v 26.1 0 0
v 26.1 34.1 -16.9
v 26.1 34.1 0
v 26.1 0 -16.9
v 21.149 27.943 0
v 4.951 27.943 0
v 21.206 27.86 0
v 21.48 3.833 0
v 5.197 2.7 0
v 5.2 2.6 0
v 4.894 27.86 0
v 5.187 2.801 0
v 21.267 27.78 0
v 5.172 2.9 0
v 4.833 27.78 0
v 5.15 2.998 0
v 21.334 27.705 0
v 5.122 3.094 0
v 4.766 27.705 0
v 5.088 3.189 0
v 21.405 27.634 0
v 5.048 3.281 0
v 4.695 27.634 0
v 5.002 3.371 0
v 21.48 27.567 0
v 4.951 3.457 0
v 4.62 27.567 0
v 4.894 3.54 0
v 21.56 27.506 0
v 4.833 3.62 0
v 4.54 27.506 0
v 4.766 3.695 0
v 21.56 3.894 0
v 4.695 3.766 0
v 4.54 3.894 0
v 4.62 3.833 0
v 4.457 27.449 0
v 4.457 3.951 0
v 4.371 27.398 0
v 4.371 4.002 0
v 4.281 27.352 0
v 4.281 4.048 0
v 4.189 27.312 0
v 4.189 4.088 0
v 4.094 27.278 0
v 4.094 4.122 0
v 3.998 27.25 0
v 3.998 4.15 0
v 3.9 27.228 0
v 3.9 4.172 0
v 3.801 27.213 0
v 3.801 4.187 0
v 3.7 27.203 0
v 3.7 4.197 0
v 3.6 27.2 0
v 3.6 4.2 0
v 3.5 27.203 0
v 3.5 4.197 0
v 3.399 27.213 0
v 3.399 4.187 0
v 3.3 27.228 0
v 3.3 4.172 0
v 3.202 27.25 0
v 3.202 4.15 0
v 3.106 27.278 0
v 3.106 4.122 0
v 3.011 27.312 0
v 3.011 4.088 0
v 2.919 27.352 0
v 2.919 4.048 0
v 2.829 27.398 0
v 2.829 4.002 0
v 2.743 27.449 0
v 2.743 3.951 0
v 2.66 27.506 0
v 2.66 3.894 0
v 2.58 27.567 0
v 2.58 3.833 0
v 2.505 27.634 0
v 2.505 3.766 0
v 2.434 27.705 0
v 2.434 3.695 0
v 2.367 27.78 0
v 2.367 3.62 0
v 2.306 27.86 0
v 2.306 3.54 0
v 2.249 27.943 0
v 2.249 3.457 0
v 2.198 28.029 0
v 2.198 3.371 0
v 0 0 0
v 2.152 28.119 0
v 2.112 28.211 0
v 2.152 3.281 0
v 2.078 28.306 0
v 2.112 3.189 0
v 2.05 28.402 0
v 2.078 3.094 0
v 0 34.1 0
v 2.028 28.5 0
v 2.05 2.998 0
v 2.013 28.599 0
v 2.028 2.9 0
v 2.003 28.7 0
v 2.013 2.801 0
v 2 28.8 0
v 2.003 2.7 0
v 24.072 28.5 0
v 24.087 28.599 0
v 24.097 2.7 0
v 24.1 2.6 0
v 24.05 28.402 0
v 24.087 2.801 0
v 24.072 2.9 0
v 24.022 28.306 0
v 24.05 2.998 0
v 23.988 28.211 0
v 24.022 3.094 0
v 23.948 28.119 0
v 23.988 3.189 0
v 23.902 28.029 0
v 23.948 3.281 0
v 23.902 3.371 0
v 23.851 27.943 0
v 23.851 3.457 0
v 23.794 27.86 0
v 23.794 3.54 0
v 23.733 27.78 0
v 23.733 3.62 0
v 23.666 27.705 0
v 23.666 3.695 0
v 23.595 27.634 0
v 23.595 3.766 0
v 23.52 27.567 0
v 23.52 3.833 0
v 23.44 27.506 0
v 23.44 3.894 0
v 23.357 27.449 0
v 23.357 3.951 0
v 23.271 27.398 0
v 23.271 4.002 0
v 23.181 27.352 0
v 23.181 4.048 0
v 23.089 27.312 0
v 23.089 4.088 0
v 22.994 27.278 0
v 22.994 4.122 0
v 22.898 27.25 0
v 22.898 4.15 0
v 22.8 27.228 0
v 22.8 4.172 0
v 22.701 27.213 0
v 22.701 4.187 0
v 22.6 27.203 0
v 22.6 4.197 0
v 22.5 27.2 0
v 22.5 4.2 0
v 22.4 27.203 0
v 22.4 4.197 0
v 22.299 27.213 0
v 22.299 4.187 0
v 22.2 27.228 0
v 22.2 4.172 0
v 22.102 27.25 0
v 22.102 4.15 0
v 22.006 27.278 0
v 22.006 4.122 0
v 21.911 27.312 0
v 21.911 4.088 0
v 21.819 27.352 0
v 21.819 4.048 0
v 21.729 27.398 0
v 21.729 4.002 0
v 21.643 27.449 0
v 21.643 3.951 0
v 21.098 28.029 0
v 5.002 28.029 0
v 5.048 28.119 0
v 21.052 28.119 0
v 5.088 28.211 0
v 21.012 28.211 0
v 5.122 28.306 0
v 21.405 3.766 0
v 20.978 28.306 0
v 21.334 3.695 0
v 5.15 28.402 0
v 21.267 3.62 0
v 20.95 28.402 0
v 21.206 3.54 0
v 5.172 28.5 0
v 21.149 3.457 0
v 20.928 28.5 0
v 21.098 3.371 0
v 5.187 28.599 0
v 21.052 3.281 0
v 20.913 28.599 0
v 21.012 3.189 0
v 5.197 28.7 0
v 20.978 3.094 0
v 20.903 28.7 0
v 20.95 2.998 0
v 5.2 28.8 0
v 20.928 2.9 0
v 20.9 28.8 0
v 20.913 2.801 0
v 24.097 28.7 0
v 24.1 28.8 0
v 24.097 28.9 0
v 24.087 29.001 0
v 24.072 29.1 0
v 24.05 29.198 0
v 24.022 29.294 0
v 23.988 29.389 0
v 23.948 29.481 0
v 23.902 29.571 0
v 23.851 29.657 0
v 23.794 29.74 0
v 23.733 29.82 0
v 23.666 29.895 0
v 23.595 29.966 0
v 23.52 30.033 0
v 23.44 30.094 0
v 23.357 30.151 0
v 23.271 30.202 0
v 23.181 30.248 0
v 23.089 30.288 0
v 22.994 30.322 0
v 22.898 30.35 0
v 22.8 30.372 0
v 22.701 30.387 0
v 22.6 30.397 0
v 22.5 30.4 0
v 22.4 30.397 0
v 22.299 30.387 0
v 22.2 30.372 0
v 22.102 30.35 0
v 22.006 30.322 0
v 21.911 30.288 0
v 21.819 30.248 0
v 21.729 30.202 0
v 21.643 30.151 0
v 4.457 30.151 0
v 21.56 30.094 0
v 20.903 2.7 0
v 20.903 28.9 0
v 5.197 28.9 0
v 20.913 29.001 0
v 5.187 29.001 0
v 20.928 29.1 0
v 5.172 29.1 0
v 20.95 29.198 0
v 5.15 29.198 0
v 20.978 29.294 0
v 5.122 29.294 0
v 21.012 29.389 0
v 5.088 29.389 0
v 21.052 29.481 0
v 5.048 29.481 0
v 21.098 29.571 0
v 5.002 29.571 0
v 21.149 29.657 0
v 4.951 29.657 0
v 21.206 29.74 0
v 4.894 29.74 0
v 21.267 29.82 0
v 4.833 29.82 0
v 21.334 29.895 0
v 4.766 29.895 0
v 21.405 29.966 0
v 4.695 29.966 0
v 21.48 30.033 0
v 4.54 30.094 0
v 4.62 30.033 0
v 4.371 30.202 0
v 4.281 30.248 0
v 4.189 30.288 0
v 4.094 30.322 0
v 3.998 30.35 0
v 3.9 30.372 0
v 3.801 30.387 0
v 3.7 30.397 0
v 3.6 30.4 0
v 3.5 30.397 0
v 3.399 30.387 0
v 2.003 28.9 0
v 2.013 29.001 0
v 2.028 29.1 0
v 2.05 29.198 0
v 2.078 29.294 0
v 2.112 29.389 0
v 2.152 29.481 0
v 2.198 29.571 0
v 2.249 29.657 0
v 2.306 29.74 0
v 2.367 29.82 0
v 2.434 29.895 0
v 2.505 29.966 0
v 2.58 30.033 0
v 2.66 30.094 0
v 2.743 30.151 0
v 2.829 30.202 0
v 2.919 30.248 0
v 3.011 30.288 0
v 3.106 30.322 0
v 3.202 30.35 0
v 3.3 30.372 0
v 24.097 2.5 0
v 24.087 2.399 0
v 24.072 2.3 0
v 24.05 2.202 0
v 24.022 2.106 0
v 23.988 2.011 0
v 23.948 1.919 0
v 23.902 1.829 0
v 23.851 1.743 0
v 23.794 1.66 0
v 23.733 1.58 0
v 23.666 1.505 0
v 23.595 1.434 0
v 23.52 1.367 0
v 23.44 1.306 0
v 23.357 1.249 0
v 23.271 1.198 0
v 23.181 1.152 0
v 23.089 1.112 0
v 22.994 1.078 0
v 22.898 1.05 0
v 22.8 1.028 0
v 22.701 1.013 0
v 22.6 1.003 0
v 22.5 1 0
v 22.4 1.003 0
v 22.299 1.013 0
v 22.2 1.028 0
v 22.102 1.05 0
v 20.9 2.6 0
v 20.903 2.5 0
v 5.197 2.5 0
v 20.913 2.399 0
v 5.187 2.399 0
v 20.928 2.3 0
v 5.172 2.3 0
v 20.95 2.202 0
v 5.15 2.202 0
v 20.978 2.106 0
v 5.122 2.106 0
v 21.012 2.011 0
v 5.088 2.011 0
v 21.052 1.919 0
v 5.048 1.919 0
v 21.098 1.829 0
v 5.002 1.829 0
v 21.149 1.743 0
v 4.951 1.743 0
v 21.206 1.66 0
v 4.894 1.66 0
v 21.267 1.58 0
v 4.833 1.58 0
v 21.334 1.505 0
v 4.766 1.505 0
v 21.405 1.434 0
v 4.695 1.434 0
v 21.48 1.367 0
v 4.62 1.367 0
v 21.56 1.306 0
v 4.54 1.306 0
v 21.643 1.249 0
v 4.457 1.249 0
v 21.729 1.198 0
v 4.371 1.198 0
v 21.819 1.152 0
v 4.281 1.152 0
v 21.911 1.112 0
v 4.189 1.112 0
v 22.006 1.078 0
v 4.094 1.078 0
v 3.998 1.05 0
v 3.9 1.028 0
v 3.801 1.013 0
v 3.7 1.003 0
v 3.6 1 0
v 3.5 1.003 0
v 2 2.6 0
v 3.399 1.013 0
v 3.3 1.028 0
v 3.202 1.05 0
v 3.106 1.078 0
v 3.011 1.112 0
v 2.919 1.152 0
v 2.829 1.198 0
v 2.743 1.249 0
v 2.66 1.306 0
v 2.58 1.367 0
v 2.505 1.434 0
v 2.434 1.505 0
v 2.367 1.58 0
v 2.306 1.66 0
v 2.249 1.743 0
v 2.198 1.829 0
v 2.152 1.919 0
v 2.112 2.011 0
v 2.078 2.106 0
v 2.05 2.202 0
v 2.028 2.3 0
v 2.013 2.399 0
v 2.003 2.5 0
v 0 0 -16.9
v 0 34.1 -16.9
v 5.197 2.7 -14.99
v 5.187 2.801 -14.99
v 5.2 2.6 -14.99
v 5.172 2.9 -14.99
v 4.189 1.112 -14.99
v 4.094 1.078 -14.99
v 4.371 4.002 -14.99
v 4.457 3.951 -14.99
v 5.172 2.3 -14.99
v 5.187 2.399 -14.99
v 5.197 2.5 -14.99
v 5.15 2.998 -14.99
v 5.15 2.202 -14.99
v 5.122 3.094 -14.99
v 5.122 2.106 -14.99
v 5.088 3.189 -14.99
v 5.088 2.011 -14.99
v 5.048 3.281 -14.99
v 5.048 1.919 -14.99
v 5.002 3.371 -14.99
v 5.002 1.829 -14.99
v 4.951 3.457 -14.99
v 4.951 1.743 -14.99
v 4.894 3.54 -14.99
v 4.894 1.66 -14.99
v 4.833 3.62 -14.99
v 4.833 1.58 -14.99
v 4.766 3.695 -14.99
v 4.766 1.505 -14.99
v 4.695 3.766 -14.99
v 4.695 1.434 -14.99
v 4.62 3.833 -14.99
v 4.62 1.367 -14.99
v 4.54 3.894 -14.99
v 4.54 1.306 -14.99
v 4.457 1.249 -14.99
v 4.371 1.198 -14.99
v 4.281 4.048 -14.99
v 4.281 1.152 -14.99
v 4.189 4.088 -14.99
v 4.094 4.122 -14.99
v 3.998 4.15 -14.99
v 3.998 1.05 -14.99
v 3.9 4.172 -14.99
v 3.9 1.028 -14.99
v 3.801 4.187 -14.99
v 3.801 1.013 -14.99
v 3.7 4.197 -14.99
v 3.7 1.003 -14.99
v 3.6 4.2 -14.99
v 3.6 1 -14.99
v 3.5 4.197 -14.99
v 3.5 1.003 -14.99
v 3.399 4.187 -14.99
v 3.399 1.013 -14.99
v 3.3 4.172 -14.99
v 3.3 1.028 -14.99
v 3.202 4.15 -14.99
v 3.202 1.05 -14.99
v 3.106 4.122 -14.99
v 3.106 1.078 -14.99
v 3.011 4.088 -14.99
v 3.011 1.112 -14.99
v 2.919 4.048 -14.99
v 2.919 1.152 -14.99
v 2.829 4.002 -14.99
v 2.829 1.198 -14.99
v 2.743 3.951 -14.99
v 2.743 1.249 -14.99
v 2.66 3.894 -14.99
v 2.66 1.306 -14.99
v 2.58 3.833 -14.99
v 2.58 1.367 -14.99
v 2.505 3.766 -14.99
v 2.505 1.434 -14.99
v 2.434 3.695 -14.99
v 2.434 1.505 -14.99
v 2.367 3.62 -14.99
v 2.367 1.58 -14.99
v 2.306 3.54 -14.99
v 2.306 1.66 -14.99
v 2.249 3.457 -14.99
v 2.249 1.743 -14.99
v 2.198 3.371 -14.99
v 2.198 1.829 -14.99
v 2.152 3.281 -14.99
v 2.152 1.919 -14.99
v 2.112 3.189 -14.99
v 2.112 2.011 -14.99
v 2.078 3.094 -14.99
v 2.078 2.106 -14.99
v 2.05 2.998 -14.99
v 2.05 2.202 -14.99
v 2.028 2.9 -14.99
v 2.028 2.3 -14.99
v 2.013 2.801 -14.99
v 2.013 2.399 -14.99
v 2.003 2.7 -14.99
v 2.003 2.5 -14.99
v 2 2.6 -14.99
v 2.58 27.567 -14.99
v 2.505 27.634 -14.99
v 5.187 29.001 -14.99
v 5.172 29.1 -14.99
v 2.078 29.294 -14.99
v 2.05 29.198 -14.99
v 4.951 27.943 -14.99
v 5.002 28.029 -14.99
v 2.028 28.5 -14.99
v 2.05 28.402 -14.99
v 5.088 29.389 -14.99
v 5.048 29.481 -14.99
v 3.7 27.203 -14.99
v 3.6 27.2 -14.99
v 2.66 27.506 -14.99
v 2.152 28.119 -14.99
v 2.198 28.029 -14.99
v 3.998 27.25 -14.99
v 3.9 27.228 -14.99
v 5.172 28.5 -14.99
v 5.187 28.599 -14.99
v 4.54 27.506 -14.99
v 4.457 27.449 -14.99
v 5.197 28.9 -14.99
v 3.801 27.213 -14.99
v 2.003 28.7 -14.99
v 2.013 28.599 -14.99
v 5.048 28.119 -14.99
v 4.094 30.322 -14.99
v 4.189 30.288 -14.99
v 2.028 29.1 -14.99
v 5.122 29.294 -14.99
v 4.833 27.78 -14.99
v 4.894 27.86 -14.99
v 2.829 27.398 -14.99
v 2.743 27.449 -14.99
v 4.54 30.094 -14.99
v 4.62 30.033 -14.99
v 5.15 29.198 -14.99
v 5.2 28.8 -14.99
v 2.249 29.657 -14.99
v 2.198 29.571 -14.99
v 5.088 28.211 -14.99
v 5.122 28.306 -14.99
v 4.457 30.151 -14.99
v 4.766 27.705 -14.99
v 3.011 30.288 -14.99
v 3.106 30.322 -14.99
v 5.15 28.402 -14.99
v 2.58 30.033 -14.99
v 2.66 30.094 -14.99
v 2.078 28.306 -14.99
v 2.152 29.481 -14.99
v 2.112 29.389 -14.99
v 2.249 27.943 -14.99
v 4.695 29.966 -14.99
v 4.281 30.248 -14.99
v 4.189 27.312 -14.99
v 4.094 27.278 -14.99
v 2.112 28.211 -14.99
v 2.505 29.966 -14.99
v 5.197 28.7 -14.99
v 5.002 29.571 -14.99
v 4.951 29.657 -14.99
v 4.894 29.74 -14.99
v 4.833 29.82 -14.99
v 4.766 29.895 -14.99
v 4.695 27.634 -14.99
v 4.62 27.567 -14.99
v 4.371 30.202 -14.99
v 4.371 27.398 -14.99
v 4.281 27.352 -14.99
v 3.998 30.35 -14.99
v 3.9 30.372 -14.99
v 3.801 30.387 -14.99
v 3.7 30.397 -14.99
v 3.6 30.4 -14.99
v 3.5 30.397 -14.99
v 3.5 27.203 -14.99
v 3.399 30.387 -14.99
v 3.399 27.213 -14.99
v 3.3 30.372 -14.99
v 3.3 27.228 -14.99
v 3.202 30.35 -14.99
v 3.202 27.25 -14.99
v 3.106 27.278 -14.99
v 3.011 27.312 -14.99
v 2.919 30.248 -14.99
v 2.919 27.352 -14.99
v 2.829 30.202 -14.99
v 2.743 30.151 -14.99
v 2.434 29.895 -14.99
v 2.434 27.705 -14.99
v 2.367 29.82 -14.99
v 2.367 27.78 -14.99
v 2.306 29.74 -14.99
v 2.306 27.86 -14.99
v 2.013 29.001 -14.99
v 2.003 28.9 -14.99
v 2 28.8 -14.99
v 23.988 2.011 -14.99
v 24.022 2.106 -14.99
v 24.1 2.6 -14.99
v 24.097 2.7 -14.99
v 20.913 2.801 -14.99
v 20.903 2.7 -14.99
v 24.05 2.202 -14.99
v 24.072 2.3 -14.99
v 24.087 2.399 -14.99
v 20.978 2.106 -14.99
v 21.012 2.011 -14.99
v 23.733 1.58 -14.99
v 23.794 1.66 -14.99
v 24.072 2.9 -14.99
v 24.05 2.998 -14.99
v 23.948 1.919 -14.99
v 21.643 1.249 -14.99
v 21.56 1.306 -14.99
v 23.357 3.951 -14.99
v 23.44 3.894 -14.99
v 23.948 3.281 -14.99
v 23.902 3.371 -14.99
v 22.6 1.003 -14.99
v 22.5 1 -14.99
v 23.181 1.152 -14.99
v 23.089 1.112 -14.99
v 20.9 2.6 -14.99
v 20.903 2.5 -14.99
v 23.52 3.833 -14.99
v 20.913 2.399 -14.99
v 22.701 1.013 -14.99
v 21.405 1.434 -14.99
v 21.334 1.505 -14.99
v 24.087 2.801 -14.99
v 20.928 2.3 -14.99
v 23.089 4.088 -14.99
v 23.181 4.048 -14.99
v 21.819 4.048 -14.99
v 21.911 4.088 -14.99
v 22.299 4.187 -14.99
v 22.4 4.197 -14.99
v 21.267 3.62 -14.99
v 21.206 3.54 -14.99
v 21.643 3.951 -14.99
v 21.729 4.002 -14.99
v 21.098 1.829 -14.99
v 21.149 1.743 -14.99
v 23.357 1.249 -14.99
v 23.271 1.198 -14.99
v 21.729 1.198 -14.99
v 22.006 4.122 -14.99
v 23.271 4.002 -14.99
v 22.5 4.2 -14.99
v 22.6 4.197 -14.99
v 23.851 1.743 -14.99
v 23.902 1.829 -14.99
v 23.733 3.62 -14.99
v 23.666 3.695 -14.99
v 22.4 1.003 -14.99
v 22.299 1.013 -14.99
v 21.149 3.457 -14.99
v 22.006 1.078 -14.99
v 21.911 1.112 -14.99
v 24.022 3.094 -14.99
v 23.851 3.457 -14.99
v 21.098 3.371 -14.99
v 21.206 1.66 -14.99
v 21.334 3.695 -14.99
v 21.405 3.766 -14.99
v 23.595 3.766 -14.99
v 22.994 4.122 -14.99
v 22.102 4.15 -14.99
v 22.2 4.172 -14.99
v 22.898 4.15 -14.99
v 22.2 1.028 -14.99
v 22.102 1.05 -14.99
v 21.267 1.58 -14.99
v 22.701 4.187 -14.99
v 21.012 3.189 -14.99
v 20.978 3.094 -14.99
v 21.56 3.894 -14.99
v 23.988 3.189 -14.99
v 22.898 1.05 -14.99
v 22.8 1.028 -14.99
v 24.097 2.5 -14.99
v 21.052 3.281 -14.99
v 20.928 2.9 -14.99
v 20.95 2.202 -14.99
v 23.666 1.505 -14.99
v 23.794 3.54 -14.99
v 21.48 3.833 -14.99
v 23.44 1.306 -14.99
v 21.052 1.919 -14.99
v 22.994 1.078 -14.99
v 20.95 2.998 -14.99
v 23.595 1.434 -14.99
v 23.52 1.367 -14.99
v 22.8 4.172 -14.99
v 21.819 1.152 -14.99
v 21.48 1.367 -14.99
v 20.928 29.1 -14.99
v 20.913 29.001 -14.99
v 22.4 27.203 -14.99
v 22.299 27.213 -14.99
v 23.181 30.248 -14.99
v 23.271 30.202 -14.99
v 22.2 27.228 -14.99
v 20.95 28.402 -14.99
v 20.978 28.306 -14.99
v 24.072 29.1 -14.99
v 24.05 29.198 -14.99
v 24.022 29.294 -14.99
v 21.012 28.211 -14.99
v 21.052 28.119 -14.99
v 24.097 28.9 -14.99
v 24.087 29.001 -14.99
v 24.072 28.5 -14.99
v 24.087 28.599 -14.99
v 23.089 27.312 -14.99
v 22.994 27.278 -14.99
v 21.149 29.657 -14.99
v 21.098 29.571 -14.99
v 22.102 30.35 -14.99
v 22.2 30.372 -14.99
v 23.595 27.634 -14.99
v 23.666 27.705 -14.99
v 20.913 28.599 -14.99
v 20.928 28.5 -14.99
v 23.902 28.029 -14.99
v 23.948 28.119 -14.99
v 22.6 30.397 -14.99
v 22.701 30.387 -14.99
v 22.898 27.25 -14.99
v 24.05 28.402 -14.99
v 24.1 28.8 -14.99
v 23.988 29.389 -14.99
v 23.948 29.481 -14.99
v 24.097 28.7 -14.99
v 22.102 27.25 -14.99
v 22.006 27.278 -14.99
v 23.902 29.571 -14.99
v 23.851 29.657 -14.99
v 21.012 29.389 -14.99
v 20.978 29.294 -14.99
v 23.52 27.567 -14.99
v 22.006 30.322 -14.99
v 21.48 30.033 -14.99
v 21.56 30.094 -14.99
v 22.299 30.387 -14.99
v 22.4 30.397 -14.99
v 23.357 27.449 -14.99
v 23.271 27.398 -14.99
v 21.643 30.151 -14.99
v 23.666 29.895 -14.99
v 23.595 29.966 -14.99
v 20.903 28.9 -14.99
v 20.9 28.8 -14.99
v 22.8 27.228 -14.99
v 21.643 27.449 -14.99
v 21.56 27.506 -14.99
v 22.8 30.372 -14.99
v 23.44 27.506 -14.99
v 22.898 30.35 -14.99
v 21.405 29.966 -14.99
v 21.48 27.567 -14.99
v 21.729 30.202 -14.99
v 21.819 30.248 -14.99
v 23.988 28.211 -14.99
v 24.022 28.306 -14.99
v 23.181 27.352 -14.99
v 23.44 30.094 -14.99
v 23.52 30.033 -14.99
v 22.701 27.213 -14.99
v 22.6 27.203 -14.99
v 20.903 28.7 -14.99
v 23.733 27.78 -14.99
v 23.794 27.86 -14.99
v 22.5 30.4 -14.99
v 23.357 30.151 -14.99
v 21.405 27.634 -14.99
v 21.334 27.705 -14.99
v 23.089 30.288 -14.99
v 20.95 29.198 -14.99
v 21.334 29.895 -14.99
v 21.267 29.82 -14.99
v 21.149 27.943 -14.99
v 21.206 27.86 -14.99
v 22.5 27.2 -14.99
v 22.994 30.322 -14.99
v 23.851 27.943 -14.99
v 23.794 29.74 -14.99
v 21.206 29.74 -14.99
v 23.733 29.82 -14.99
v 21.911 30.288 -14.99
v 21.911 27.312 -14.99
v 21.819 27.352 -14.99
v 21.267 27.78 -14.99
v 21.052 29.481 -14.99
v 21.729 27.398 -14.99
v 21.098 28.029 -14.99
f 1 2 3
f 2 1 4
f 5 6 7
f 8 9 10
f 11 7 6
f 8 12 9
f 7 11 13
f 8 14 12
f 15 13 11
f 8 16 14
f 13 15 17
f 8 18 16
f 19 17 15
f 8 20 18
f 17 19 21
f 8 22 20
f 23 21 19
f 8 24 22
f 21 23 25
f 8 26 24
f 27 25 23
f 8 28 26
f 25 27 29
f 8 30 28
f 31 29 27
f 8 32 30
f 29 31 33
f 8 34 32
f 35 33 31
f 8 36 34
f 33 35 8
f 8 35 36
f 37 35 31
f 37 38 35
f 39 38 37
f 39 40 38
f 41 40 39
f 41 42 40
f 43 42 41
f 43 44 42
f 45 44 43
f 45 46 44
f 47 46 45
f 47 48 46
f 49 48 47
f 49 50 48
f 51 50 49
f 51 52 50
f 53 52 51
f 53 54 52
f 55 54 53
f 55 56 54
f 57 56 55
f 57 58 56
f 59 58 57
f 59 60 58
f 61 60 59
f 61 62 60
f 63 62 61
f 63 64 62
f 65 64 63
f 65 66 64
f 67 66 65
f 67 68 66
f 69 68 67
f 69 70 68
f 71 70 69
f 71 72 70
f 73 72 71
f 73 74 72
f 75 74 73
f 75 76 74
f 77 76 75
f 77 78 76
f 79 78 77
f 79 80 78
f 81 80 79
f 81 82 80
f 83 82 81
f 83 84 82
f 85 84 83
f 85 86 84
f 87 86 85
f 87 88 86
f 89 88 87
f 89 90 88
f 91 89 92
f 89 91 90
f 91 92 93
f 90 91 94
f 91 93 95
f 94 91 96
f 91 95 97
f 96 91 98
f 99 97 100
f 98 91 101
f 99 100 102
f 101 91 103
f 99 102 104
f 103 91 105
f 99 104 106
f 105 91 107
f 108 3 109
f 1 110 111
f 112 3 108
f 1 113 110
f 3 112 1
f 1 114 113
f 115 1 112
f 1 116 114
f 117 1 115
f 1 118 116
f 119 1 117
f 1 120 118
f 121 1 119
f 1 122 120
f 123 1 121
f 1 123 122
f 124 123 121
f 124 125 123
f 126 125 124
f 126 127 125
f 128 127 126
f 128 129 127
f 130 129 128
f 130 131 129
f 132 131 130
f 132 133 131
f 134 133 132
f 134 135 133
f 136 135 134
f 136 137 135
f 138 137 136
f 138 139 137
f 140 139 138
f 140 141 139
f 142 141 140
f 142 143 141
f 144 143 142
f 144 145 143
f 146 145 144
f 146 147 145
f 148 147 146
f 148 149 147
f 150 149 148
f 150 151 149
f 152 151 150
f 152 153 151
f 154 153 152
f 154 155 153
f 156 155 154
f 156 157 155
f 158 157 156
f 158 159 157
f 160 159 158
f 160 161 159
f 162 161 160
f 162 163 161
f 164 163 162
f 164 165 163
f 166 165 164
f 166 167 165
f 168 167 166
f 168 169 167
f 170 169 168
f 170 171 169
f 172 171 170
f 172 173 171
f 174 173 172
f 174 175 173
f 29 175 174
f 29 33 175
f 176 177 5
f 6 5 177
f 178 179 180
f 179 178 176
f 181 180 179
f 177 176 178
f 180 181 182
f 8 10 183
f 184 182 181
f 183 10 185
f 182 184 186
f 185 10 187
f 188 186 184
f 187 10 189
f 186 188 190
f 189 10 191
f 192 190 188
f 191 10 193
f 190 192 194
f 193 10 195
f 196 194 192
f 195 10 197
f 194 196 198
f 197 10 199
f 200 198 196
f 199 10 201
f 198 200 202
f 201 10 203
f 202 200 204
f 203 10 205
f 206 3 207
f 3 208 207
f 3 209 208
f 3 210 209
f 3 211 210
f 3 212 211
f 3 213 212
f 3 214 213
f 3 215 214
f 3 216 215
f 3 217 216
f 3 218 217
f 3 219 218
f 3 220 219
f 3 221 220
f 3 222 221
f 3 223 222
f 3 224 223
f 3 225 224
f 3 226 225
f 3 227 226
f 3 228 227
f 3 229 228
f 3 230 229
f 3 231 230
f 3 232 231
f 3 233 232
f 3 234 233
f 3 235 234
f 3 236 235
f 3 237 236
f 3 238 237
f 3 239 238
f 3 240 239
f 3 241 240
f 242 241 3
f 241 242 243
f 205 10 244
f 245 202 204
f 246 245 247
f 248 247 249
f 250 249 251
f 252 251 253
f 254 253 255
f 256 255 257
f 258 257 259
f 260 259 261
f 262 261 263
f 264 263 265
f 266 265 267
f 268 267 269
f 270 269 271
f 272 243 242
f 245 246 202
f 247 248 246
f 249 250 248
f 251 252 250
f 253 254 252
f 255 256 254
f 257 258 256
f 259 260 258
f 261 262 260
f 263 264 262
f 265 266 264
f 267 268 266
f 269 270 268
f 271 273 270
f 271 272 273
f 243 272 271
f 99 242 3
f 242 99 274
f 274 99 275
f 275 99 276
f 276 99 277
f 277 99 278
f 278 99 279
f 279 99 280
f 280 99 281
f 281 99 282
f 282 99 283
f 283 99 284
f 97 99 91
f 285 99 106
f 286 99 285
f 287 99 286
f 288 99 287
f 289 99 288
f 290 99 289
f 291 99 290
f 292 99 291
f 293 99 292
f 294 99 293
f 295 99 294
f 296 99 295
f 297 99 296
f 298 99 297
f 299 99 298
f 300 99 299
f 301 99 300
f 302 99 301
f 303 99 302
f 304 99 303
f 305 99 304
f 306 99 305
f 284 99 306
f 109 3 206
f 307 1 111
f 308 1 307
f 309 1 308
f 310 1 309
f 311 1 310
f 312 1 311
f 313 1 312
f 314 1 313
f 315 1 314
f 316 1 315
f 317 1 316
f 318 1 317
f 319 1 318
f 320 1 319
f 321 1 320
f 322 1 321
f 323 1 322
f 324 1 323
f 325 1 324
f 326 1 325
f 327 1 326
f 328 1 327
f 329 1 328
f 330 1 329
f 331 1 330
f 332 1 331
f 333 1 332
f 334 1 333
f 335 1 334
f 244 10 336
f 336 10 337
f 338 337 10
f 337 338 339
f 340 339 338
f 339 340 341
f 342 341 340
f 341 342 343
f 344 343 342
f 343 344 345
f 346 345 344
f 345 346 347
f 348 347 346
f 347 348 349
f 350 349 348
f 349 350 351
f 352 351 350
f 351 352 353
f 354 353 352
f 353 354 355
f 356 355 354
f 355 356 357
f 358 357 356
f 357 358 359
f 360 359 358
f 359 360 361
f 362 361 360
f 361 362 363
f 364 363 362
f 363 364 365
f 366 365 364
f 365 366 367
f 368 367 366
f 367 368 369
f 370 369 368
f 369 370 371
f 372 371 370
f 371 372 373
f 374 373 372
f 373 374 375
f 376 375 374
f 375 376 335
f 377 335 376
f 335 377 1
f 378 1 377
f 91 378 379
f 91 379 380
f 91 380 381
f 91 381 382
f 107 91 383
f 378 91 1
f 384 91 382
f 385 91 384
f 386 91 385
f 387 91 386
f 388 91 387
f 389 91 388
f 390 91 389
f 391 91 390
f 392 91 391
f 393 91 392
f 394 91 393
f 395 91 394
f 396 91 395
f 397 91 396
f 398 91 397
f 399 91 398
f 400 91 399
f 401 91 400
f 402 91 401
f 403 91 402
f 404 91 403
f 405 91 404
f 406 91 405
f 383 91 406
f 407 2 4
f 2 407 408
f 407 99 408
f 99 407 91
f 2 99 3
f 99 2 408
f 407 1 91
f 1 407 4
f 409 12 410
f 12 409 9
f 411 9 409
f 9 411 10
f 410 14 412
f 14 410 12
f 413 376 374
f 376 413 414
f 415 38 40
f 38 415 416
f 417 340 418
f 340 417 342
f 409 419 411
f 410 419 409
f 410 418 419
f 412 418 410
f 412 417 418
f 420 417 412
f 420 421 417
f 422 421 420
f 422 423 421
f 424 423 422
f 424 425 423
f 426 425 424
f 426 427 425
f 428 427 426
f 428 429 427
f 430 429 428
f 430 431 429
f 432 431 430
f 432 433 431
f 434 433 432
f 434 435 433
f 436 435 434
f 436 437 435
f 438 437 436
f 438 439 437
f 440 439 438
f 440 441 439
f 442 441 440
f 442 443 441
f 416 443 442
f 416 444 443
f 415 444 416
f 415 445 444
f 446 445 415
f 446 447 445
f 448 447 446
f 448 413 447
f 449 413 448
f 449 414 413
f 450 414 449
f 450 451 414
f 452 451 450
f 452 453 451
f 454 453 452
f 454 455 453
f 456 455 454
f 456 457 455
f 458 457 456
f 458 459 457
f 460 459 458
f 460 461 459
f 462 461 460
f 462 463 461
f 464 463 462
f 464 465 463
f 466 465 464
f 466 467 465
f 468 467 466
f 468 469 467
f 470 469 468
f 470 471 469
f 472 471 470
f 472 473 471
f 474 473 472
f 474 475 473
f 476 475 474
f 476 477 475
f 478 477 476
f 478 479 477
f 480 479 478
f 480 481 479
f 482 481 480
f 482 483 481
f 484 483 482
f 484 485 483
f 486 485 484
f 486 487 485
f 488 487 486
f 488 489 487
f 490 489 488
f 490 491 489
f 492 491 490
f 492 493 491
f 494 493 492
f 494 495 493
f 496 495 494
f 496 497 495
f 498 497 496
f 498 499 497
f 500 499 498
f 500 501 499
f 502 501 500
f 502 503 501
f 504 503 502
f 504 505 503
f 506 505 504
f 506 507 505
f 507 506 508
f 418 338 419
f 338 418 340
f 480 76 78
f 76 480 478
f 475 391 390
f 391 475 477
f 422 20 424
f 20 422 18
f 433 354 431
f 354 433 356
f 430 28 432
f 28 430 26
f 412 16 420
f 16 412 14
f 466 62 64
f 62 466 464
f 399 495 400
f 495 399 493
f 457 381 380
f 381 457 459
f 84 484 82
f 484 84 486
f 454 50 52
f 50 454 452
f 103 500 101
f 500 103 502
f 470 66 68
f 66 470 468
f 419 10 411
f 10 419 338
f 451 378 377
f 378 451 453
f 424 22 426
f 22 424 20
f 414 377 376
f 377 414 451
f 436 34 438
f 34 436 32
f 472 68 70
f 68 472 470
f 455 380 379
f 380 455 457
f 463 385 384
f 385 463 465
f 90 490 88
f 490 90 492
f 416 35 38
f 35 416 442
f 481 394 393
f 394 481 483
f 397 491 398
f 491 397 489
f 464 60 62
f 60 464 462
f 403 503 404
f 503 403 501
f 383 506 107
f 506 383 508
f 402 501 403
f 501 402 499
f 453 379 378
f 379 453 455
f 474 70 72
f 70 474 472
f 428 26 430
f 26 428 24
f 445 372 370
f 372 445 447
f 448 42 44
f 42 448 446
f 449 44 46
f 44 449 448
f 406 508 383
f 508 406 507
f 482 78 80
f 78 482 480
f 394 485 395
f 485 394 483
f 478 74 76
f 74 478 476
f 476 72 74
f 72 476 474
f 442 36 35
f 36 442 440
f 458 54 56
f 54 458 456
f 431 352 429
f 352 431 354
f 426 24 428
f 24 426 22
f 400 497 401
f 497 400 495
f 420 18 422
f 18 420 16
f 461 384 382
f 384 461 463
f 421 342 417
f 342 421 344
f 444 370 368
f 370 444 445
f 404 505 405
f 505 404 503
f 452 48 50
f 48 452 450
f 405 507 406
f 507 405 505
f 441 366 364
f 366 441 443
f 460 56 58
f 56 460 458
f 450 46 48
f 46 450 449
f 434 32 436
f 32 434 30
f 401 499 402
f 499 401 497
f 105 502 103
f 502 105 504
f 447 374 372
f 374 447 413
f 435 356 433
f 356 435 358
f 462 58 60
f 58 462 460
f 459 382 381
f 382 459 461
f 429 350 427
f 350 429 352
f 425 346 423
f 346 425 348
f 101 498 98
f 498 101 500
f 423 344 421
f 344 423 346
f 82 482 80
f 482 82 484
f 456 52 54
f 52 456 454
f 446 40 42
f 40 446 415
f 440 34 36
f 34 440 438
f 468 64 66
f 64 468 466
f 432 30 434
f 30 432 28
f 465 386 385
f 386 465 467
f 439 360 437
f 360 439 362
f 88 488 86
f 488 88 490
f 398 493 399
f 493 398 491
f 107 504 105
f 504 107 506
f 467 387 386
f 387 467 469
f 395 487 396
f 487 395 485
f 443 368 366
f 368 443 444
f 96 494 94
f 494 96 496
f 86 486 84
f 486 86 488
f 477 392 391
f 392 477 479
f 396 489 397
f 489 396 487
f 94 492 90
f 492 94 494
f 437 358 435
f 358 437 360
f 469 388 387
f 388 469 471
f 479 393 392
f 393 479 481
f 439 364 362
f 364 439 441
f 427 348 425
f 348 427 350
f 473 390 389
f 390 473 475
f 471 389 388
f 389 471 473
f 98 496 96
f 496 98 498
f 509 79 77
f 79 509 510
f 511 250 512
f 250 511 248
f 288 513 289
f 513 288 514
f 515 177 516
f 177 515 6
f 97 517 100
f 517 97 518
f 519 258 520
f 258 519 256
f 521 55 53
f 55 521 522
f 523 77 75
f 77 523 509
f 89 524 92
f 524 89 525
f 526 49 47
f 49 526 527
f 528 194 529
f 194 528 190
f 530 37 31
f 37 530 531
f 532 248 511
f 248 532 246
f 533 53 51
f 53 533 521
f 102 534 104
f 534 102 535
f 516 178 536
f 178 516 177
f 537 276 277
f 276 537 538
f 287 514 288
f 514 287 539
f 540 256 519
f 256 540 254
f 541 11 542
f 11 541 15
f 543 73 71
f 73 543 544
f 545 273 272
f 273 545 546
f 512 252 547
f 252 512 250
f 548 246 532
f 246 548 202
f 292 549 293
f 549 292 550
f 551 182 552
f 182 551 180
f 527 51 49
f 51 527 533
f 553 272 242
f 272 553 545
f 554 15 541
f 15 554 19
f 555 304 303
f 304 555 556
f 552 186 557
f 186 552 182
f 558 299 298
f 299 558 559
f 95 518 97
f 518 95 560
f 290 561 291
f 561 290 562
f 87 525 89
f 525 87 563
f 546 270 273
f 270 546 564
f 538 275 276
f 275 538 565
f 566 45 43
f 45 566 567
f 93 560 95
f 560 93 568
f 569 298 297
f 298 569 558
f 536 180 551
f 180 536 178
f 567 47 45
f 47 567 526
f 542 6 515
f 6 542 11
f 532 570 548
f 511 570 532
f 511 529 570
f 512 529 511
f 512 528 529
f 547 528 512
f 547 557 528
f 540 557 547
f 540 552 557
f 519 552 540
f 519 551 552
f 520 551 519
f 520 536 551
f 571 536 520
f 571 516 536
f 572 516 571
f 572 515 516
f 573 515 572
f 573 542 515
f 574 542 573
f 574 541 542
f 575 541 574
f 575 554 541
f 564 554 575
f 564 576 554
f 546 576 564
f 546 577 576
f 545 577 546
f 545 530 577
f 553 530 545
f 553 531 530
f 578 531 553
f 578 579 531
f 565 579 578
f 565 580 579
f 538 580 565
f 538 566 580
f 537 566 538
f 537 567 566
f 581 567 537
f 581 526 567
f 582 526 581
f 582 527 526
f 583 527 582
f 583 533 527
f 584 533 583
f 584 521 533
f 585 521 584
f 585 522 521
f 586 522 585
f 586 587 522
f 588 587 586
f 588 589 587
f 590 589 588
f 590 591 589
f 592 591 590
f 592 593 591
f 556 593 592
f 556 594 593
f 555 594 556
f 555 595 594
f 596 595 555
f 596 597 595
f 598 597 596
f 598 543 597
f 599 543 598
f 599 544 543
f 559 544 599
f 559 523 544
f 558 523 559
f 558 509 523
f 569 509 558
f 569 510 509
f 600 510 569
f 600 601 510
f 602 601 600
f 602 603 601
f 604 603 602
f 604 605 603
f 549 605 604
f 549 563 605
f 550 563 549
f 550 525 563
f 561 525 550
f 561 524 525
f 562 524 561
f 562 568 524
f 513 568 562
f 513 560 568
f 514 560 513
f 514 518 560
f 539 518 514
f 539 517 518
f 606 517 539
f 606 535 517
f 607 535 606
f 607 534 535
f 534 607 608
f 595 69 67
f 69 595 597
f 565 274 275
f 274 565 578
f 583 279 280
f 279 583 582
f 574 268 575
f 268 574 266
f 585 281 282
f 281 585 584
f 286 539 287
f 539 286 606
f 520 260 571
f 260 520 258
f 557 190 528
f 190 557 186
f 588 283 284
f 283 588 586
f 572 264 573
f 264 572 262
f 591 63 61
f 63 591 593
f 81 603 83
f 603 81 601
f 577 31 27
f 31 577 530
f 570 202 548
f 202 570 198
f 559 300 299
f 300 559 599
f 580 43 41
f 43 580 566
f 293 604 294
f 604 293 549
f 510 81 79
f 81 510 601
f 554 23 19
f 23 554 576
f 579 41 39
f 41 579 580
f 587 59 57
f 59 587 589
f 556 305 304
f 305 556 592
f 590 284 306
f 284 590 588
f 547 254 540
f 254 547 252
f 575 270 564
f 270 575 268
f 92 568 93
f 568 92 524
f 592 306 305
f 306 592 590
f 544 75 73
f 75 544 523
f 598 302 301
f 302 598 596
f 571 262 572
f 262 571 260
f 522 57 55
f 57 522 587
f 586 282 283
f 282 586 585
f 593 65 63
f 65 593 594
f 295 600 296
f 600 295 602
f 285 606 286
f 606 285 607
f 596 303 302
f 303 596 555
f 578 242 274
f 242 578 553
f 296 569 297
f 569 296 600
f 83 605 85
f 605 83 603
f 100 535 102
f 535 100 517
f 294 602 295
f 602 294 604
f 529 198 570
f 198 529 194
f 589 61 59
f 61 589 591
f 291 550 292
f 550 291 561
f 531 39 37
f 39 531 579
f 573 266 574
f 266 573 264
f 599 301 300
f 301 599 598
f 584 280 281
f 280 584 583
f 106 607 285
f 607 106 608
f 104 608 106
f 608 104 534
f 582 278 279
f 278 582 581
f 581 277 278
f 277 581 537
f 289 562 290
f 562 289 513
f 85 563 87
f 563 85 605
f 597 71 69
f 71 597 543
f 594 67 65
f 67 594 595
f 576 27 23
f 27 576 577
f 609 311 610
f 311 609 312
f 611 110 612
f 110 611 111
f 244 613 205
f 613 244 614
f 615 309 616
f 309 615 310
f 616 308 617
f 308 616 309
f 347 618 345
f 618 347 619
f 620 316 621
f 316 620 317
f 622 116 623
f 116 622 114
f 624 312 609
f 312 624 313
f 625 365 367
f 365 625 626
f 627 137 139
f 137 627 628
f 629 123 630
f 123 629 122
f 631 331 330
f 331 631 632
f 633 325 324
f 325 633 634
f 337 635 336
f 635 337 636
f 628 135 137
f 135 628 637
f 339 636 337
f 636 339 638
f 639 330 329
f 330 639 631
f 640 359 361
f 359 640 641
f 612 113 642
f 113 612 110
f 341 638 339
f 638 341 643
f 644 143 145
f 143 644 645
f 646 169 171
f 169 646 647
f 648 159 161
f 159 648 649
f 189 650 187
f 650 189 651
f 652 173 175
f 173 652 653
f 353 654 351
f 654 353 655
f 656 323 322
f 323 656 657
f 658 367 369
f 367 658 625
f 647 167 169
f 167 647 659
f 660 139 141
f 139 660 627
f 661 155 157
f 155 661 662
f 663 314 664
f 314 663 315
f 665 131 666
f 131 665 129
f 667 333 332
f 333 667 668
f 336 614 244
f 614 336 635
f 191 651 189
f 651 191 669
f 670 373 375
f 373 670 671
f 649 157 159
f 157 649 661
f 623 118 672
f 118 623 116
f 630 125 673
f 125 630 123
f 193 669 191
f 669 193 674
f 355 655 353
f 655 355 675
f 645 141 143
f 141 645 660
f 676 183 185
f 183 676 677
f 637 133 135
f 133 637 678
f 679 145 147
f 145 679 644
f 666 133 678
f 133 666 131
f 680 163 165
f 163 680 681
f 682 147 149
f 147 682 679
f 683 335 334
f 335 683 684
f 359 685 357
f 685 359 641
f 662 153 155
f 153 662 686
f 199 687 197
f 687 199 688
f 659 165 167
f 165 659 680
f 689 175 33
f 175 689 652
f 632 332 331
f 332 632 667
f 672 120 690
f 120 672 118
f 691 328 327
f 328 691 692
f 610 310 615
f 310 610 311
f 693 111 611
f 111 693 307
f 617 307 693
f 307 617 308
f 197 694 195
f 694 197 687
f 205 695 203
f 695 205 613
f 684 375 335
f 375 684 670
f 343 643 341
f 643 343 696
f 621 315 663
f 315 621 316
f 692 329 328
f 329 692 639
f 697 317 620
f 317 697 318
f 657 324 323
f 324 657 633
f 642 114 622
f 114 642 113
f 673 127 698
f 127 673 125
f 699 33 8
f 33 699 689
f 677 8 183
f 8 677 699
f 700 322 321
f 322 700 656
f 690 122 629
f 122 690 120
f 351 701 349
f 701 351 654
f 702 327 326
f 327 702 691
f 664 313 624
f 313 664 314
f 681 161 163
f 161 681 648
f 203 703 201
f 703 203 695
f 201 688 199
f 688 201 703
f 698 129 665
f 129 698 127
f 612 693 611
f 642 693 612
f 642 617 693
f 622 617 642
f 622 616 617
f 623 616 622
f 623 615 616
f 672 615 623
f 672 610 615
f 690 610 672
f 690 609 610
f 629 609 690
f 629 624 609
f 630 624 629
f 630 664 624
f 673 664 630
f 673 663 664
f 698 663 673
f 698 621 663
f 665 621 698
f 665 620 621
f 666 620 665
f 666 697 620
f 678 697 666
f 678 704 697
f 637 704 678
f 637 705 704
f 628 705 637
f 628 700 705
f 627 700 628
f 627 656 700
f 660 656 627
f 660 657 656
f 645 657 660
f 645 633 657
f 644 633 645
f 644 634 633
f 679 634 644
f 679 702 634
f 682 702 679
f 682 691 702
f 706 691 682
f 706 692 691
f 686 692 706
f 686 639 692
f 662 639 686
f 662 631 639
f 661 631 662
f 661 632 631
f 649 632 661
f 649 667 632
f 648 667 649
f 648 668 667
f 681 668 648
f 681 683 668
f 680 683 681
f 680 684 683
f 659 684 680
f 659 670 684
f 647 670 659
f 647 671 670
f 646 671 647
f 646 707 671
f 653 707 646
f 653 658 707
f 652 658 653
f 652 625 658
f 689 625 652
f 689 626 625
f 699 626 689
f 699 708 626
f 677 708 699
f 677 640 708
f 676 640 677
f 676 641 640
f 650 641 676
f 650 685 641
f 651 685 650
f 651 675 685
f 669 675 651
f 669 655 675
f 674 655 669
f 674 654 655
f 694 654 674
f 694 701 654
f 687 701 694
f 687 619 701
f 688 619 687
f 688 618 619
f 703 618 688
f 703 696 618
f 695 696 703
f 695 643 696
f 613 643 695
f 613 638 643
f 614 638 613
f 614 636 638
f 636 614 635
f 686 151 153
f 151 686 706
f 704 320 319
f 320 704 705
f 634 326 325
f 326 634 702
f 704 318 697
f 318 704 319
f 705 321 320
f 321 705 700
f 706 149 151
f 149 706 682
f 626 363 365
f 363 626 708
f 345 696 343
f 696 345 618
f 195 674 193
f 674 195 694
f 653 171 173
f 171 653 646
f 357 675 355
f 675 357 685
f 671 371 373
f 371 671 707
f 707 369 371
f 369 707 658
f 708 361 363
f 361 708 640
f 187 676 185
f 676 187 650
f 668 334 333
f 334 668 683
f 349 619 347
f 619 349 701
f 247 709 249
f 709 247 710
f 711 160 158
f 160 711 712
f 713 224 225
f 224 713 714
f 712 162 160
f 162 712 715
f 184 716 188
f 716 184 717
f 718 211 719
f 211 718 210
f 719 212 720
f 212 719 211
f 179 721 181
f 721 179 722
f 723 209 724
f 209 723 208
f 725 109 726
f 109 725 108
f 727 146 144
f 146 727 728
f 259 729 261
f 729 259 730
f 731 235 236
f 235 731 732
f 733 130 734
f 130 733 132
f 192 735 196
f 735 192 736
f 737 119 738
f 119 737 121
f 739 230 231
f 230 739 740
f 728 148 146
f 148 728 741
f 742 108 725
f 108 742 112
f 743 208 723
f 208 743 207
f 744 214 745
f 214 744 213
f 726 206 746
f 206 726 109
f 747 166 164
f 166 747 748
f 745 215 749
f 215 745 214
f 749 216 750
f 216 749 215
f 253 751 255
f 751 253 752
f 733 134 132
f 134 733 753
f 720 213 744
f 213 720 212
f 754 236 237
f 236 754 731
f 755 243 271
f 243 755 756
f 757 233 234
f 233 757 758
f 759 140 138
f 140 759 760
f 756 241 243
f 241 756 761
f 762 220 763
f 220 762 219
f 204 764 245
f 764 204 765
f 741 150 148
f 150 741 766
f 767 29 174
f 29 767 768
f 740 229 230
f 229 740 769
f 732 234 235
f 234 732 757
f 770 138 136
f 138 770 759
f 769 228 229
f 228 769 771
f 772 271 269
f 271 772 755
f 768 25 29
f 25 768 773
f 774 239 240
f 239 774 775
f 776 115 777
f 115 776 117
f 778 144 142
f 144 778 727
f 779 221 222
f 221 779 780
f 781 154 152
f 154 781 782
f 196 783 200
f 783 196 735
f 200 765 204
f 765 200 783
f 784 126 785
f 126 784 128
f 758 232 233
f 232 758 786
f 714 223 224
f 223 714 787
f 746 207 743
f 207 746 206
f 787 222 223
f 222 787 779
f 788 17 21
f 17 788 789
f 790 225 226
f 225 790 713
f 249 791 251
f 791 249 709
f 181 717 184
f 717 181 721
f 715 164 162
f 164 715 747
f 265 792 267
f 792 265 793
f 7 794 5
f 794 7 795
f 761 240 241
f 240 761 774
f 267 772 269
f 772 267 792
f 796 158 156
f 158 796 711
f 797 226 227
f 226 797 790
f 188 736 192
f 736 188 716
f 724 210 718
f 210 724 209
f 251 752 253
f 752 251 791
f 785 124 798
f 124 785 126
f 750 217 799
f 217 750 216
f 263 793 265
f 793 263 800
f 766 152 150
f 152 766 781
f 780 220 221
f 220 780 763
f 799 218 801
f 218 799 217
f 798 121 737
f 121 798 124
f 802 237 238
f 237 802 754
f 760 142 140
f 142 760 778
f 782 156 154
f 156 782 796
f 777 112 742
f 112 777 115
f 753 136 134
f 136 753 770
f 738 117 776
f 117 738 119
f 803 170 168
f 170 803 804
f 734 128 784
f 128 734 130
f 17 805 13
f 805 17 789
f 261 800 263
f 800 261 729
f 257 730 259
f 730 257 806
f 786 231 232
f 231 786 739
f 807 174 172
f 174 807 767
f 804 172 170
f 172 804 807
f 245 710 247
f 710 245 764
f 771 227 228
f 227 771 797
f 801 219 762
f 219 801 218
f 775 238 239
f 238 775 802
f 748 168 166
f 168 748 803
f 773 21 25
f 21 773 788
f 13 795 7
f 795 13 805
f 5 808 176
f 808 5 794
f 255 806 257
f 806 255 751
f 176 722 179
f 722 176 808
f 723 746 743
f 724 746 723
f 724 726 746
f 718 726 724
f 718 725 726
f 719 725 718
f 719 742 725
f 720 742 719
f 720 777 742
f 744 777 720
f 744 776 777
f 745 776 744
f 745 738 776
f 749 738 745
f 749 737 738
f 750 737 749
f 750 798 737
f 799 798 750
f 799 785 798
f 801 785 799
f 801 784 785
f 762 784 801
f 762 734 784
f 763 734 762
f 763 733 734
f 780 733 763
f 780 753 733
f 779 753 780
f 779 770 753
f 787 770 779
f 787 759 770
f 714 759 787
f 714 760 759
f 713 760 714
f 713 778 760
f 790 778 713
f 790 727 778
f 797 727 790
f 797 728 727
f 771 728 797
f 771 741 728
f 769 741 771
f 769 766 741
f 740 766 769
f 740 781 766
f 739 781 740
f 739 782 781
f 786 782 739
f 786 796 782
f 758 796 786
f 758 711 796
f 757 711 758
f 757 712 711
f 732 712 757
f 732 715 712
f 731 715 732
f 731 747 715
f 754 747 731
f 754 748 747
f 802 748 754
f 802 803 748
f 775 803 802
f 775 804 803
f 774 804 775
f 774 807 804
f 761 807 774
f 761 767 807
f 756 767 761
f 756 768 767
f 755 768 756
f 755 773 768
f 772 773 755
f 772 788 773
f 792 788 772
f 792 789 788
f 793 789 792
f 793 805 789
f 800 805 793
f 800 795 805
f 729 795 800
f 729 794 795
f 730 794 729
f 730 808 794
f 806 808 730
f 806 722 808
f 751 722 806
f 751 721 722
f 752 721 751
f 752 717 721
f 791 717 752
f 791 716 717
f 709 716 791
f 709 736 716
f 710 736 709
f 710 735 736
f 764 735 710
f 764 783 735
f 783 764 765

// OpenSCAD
$fn = 100;
wallThicknes = 1.2;//mm
panelThicknes = 3;//mm
height = 35;

joystickScrewHeight = 15;
joystickScrewDiameter = 3.2;
howMuchShouldTheJoystickStandOut = 12.6;

module joystickScrewHole(){
    translate([0,0,-joystickScrewHeight/2])
    #cylinder(joystickScrewHeight,joystickScrewDiameter/2,joystickScrewDiameter/2,center=true);
}

difference(){
    baseWidth = 26.1;
    baseHeight= 34.1;
    
    translate([0,0,-(height+panelThicknes-(32.5-howMuchShouldTheJoystickStandOut)-wallThicknes)])
    cube([baseWidth,baseHeight,height+panelThicknes-(32.5-howMuchShouldTheJoystickStandOut)-wallThicknes]);
    
    //screw holes
    translate([2+joystickScrewDiameter/2,1+joystickScrewDiameter/2,0.01])
    joystickScrewHole();
    translate([2+joystickScrewDiameter/2,baseHeight-3.7-joystickScrewDiameter/2,0.01])
    joystickScrewHole();
    translate([baseWidth-2-joystickScrewDiameter/2,1+joystickScrewDiameter/2,0.01])
    joystickScrewHole();
    translate([baseWidth-2-joystickScrewDiameter/2,baseHeight-3.7-joystickScrewDiameter/2,0.01])
    joystickScrewHole();
}
